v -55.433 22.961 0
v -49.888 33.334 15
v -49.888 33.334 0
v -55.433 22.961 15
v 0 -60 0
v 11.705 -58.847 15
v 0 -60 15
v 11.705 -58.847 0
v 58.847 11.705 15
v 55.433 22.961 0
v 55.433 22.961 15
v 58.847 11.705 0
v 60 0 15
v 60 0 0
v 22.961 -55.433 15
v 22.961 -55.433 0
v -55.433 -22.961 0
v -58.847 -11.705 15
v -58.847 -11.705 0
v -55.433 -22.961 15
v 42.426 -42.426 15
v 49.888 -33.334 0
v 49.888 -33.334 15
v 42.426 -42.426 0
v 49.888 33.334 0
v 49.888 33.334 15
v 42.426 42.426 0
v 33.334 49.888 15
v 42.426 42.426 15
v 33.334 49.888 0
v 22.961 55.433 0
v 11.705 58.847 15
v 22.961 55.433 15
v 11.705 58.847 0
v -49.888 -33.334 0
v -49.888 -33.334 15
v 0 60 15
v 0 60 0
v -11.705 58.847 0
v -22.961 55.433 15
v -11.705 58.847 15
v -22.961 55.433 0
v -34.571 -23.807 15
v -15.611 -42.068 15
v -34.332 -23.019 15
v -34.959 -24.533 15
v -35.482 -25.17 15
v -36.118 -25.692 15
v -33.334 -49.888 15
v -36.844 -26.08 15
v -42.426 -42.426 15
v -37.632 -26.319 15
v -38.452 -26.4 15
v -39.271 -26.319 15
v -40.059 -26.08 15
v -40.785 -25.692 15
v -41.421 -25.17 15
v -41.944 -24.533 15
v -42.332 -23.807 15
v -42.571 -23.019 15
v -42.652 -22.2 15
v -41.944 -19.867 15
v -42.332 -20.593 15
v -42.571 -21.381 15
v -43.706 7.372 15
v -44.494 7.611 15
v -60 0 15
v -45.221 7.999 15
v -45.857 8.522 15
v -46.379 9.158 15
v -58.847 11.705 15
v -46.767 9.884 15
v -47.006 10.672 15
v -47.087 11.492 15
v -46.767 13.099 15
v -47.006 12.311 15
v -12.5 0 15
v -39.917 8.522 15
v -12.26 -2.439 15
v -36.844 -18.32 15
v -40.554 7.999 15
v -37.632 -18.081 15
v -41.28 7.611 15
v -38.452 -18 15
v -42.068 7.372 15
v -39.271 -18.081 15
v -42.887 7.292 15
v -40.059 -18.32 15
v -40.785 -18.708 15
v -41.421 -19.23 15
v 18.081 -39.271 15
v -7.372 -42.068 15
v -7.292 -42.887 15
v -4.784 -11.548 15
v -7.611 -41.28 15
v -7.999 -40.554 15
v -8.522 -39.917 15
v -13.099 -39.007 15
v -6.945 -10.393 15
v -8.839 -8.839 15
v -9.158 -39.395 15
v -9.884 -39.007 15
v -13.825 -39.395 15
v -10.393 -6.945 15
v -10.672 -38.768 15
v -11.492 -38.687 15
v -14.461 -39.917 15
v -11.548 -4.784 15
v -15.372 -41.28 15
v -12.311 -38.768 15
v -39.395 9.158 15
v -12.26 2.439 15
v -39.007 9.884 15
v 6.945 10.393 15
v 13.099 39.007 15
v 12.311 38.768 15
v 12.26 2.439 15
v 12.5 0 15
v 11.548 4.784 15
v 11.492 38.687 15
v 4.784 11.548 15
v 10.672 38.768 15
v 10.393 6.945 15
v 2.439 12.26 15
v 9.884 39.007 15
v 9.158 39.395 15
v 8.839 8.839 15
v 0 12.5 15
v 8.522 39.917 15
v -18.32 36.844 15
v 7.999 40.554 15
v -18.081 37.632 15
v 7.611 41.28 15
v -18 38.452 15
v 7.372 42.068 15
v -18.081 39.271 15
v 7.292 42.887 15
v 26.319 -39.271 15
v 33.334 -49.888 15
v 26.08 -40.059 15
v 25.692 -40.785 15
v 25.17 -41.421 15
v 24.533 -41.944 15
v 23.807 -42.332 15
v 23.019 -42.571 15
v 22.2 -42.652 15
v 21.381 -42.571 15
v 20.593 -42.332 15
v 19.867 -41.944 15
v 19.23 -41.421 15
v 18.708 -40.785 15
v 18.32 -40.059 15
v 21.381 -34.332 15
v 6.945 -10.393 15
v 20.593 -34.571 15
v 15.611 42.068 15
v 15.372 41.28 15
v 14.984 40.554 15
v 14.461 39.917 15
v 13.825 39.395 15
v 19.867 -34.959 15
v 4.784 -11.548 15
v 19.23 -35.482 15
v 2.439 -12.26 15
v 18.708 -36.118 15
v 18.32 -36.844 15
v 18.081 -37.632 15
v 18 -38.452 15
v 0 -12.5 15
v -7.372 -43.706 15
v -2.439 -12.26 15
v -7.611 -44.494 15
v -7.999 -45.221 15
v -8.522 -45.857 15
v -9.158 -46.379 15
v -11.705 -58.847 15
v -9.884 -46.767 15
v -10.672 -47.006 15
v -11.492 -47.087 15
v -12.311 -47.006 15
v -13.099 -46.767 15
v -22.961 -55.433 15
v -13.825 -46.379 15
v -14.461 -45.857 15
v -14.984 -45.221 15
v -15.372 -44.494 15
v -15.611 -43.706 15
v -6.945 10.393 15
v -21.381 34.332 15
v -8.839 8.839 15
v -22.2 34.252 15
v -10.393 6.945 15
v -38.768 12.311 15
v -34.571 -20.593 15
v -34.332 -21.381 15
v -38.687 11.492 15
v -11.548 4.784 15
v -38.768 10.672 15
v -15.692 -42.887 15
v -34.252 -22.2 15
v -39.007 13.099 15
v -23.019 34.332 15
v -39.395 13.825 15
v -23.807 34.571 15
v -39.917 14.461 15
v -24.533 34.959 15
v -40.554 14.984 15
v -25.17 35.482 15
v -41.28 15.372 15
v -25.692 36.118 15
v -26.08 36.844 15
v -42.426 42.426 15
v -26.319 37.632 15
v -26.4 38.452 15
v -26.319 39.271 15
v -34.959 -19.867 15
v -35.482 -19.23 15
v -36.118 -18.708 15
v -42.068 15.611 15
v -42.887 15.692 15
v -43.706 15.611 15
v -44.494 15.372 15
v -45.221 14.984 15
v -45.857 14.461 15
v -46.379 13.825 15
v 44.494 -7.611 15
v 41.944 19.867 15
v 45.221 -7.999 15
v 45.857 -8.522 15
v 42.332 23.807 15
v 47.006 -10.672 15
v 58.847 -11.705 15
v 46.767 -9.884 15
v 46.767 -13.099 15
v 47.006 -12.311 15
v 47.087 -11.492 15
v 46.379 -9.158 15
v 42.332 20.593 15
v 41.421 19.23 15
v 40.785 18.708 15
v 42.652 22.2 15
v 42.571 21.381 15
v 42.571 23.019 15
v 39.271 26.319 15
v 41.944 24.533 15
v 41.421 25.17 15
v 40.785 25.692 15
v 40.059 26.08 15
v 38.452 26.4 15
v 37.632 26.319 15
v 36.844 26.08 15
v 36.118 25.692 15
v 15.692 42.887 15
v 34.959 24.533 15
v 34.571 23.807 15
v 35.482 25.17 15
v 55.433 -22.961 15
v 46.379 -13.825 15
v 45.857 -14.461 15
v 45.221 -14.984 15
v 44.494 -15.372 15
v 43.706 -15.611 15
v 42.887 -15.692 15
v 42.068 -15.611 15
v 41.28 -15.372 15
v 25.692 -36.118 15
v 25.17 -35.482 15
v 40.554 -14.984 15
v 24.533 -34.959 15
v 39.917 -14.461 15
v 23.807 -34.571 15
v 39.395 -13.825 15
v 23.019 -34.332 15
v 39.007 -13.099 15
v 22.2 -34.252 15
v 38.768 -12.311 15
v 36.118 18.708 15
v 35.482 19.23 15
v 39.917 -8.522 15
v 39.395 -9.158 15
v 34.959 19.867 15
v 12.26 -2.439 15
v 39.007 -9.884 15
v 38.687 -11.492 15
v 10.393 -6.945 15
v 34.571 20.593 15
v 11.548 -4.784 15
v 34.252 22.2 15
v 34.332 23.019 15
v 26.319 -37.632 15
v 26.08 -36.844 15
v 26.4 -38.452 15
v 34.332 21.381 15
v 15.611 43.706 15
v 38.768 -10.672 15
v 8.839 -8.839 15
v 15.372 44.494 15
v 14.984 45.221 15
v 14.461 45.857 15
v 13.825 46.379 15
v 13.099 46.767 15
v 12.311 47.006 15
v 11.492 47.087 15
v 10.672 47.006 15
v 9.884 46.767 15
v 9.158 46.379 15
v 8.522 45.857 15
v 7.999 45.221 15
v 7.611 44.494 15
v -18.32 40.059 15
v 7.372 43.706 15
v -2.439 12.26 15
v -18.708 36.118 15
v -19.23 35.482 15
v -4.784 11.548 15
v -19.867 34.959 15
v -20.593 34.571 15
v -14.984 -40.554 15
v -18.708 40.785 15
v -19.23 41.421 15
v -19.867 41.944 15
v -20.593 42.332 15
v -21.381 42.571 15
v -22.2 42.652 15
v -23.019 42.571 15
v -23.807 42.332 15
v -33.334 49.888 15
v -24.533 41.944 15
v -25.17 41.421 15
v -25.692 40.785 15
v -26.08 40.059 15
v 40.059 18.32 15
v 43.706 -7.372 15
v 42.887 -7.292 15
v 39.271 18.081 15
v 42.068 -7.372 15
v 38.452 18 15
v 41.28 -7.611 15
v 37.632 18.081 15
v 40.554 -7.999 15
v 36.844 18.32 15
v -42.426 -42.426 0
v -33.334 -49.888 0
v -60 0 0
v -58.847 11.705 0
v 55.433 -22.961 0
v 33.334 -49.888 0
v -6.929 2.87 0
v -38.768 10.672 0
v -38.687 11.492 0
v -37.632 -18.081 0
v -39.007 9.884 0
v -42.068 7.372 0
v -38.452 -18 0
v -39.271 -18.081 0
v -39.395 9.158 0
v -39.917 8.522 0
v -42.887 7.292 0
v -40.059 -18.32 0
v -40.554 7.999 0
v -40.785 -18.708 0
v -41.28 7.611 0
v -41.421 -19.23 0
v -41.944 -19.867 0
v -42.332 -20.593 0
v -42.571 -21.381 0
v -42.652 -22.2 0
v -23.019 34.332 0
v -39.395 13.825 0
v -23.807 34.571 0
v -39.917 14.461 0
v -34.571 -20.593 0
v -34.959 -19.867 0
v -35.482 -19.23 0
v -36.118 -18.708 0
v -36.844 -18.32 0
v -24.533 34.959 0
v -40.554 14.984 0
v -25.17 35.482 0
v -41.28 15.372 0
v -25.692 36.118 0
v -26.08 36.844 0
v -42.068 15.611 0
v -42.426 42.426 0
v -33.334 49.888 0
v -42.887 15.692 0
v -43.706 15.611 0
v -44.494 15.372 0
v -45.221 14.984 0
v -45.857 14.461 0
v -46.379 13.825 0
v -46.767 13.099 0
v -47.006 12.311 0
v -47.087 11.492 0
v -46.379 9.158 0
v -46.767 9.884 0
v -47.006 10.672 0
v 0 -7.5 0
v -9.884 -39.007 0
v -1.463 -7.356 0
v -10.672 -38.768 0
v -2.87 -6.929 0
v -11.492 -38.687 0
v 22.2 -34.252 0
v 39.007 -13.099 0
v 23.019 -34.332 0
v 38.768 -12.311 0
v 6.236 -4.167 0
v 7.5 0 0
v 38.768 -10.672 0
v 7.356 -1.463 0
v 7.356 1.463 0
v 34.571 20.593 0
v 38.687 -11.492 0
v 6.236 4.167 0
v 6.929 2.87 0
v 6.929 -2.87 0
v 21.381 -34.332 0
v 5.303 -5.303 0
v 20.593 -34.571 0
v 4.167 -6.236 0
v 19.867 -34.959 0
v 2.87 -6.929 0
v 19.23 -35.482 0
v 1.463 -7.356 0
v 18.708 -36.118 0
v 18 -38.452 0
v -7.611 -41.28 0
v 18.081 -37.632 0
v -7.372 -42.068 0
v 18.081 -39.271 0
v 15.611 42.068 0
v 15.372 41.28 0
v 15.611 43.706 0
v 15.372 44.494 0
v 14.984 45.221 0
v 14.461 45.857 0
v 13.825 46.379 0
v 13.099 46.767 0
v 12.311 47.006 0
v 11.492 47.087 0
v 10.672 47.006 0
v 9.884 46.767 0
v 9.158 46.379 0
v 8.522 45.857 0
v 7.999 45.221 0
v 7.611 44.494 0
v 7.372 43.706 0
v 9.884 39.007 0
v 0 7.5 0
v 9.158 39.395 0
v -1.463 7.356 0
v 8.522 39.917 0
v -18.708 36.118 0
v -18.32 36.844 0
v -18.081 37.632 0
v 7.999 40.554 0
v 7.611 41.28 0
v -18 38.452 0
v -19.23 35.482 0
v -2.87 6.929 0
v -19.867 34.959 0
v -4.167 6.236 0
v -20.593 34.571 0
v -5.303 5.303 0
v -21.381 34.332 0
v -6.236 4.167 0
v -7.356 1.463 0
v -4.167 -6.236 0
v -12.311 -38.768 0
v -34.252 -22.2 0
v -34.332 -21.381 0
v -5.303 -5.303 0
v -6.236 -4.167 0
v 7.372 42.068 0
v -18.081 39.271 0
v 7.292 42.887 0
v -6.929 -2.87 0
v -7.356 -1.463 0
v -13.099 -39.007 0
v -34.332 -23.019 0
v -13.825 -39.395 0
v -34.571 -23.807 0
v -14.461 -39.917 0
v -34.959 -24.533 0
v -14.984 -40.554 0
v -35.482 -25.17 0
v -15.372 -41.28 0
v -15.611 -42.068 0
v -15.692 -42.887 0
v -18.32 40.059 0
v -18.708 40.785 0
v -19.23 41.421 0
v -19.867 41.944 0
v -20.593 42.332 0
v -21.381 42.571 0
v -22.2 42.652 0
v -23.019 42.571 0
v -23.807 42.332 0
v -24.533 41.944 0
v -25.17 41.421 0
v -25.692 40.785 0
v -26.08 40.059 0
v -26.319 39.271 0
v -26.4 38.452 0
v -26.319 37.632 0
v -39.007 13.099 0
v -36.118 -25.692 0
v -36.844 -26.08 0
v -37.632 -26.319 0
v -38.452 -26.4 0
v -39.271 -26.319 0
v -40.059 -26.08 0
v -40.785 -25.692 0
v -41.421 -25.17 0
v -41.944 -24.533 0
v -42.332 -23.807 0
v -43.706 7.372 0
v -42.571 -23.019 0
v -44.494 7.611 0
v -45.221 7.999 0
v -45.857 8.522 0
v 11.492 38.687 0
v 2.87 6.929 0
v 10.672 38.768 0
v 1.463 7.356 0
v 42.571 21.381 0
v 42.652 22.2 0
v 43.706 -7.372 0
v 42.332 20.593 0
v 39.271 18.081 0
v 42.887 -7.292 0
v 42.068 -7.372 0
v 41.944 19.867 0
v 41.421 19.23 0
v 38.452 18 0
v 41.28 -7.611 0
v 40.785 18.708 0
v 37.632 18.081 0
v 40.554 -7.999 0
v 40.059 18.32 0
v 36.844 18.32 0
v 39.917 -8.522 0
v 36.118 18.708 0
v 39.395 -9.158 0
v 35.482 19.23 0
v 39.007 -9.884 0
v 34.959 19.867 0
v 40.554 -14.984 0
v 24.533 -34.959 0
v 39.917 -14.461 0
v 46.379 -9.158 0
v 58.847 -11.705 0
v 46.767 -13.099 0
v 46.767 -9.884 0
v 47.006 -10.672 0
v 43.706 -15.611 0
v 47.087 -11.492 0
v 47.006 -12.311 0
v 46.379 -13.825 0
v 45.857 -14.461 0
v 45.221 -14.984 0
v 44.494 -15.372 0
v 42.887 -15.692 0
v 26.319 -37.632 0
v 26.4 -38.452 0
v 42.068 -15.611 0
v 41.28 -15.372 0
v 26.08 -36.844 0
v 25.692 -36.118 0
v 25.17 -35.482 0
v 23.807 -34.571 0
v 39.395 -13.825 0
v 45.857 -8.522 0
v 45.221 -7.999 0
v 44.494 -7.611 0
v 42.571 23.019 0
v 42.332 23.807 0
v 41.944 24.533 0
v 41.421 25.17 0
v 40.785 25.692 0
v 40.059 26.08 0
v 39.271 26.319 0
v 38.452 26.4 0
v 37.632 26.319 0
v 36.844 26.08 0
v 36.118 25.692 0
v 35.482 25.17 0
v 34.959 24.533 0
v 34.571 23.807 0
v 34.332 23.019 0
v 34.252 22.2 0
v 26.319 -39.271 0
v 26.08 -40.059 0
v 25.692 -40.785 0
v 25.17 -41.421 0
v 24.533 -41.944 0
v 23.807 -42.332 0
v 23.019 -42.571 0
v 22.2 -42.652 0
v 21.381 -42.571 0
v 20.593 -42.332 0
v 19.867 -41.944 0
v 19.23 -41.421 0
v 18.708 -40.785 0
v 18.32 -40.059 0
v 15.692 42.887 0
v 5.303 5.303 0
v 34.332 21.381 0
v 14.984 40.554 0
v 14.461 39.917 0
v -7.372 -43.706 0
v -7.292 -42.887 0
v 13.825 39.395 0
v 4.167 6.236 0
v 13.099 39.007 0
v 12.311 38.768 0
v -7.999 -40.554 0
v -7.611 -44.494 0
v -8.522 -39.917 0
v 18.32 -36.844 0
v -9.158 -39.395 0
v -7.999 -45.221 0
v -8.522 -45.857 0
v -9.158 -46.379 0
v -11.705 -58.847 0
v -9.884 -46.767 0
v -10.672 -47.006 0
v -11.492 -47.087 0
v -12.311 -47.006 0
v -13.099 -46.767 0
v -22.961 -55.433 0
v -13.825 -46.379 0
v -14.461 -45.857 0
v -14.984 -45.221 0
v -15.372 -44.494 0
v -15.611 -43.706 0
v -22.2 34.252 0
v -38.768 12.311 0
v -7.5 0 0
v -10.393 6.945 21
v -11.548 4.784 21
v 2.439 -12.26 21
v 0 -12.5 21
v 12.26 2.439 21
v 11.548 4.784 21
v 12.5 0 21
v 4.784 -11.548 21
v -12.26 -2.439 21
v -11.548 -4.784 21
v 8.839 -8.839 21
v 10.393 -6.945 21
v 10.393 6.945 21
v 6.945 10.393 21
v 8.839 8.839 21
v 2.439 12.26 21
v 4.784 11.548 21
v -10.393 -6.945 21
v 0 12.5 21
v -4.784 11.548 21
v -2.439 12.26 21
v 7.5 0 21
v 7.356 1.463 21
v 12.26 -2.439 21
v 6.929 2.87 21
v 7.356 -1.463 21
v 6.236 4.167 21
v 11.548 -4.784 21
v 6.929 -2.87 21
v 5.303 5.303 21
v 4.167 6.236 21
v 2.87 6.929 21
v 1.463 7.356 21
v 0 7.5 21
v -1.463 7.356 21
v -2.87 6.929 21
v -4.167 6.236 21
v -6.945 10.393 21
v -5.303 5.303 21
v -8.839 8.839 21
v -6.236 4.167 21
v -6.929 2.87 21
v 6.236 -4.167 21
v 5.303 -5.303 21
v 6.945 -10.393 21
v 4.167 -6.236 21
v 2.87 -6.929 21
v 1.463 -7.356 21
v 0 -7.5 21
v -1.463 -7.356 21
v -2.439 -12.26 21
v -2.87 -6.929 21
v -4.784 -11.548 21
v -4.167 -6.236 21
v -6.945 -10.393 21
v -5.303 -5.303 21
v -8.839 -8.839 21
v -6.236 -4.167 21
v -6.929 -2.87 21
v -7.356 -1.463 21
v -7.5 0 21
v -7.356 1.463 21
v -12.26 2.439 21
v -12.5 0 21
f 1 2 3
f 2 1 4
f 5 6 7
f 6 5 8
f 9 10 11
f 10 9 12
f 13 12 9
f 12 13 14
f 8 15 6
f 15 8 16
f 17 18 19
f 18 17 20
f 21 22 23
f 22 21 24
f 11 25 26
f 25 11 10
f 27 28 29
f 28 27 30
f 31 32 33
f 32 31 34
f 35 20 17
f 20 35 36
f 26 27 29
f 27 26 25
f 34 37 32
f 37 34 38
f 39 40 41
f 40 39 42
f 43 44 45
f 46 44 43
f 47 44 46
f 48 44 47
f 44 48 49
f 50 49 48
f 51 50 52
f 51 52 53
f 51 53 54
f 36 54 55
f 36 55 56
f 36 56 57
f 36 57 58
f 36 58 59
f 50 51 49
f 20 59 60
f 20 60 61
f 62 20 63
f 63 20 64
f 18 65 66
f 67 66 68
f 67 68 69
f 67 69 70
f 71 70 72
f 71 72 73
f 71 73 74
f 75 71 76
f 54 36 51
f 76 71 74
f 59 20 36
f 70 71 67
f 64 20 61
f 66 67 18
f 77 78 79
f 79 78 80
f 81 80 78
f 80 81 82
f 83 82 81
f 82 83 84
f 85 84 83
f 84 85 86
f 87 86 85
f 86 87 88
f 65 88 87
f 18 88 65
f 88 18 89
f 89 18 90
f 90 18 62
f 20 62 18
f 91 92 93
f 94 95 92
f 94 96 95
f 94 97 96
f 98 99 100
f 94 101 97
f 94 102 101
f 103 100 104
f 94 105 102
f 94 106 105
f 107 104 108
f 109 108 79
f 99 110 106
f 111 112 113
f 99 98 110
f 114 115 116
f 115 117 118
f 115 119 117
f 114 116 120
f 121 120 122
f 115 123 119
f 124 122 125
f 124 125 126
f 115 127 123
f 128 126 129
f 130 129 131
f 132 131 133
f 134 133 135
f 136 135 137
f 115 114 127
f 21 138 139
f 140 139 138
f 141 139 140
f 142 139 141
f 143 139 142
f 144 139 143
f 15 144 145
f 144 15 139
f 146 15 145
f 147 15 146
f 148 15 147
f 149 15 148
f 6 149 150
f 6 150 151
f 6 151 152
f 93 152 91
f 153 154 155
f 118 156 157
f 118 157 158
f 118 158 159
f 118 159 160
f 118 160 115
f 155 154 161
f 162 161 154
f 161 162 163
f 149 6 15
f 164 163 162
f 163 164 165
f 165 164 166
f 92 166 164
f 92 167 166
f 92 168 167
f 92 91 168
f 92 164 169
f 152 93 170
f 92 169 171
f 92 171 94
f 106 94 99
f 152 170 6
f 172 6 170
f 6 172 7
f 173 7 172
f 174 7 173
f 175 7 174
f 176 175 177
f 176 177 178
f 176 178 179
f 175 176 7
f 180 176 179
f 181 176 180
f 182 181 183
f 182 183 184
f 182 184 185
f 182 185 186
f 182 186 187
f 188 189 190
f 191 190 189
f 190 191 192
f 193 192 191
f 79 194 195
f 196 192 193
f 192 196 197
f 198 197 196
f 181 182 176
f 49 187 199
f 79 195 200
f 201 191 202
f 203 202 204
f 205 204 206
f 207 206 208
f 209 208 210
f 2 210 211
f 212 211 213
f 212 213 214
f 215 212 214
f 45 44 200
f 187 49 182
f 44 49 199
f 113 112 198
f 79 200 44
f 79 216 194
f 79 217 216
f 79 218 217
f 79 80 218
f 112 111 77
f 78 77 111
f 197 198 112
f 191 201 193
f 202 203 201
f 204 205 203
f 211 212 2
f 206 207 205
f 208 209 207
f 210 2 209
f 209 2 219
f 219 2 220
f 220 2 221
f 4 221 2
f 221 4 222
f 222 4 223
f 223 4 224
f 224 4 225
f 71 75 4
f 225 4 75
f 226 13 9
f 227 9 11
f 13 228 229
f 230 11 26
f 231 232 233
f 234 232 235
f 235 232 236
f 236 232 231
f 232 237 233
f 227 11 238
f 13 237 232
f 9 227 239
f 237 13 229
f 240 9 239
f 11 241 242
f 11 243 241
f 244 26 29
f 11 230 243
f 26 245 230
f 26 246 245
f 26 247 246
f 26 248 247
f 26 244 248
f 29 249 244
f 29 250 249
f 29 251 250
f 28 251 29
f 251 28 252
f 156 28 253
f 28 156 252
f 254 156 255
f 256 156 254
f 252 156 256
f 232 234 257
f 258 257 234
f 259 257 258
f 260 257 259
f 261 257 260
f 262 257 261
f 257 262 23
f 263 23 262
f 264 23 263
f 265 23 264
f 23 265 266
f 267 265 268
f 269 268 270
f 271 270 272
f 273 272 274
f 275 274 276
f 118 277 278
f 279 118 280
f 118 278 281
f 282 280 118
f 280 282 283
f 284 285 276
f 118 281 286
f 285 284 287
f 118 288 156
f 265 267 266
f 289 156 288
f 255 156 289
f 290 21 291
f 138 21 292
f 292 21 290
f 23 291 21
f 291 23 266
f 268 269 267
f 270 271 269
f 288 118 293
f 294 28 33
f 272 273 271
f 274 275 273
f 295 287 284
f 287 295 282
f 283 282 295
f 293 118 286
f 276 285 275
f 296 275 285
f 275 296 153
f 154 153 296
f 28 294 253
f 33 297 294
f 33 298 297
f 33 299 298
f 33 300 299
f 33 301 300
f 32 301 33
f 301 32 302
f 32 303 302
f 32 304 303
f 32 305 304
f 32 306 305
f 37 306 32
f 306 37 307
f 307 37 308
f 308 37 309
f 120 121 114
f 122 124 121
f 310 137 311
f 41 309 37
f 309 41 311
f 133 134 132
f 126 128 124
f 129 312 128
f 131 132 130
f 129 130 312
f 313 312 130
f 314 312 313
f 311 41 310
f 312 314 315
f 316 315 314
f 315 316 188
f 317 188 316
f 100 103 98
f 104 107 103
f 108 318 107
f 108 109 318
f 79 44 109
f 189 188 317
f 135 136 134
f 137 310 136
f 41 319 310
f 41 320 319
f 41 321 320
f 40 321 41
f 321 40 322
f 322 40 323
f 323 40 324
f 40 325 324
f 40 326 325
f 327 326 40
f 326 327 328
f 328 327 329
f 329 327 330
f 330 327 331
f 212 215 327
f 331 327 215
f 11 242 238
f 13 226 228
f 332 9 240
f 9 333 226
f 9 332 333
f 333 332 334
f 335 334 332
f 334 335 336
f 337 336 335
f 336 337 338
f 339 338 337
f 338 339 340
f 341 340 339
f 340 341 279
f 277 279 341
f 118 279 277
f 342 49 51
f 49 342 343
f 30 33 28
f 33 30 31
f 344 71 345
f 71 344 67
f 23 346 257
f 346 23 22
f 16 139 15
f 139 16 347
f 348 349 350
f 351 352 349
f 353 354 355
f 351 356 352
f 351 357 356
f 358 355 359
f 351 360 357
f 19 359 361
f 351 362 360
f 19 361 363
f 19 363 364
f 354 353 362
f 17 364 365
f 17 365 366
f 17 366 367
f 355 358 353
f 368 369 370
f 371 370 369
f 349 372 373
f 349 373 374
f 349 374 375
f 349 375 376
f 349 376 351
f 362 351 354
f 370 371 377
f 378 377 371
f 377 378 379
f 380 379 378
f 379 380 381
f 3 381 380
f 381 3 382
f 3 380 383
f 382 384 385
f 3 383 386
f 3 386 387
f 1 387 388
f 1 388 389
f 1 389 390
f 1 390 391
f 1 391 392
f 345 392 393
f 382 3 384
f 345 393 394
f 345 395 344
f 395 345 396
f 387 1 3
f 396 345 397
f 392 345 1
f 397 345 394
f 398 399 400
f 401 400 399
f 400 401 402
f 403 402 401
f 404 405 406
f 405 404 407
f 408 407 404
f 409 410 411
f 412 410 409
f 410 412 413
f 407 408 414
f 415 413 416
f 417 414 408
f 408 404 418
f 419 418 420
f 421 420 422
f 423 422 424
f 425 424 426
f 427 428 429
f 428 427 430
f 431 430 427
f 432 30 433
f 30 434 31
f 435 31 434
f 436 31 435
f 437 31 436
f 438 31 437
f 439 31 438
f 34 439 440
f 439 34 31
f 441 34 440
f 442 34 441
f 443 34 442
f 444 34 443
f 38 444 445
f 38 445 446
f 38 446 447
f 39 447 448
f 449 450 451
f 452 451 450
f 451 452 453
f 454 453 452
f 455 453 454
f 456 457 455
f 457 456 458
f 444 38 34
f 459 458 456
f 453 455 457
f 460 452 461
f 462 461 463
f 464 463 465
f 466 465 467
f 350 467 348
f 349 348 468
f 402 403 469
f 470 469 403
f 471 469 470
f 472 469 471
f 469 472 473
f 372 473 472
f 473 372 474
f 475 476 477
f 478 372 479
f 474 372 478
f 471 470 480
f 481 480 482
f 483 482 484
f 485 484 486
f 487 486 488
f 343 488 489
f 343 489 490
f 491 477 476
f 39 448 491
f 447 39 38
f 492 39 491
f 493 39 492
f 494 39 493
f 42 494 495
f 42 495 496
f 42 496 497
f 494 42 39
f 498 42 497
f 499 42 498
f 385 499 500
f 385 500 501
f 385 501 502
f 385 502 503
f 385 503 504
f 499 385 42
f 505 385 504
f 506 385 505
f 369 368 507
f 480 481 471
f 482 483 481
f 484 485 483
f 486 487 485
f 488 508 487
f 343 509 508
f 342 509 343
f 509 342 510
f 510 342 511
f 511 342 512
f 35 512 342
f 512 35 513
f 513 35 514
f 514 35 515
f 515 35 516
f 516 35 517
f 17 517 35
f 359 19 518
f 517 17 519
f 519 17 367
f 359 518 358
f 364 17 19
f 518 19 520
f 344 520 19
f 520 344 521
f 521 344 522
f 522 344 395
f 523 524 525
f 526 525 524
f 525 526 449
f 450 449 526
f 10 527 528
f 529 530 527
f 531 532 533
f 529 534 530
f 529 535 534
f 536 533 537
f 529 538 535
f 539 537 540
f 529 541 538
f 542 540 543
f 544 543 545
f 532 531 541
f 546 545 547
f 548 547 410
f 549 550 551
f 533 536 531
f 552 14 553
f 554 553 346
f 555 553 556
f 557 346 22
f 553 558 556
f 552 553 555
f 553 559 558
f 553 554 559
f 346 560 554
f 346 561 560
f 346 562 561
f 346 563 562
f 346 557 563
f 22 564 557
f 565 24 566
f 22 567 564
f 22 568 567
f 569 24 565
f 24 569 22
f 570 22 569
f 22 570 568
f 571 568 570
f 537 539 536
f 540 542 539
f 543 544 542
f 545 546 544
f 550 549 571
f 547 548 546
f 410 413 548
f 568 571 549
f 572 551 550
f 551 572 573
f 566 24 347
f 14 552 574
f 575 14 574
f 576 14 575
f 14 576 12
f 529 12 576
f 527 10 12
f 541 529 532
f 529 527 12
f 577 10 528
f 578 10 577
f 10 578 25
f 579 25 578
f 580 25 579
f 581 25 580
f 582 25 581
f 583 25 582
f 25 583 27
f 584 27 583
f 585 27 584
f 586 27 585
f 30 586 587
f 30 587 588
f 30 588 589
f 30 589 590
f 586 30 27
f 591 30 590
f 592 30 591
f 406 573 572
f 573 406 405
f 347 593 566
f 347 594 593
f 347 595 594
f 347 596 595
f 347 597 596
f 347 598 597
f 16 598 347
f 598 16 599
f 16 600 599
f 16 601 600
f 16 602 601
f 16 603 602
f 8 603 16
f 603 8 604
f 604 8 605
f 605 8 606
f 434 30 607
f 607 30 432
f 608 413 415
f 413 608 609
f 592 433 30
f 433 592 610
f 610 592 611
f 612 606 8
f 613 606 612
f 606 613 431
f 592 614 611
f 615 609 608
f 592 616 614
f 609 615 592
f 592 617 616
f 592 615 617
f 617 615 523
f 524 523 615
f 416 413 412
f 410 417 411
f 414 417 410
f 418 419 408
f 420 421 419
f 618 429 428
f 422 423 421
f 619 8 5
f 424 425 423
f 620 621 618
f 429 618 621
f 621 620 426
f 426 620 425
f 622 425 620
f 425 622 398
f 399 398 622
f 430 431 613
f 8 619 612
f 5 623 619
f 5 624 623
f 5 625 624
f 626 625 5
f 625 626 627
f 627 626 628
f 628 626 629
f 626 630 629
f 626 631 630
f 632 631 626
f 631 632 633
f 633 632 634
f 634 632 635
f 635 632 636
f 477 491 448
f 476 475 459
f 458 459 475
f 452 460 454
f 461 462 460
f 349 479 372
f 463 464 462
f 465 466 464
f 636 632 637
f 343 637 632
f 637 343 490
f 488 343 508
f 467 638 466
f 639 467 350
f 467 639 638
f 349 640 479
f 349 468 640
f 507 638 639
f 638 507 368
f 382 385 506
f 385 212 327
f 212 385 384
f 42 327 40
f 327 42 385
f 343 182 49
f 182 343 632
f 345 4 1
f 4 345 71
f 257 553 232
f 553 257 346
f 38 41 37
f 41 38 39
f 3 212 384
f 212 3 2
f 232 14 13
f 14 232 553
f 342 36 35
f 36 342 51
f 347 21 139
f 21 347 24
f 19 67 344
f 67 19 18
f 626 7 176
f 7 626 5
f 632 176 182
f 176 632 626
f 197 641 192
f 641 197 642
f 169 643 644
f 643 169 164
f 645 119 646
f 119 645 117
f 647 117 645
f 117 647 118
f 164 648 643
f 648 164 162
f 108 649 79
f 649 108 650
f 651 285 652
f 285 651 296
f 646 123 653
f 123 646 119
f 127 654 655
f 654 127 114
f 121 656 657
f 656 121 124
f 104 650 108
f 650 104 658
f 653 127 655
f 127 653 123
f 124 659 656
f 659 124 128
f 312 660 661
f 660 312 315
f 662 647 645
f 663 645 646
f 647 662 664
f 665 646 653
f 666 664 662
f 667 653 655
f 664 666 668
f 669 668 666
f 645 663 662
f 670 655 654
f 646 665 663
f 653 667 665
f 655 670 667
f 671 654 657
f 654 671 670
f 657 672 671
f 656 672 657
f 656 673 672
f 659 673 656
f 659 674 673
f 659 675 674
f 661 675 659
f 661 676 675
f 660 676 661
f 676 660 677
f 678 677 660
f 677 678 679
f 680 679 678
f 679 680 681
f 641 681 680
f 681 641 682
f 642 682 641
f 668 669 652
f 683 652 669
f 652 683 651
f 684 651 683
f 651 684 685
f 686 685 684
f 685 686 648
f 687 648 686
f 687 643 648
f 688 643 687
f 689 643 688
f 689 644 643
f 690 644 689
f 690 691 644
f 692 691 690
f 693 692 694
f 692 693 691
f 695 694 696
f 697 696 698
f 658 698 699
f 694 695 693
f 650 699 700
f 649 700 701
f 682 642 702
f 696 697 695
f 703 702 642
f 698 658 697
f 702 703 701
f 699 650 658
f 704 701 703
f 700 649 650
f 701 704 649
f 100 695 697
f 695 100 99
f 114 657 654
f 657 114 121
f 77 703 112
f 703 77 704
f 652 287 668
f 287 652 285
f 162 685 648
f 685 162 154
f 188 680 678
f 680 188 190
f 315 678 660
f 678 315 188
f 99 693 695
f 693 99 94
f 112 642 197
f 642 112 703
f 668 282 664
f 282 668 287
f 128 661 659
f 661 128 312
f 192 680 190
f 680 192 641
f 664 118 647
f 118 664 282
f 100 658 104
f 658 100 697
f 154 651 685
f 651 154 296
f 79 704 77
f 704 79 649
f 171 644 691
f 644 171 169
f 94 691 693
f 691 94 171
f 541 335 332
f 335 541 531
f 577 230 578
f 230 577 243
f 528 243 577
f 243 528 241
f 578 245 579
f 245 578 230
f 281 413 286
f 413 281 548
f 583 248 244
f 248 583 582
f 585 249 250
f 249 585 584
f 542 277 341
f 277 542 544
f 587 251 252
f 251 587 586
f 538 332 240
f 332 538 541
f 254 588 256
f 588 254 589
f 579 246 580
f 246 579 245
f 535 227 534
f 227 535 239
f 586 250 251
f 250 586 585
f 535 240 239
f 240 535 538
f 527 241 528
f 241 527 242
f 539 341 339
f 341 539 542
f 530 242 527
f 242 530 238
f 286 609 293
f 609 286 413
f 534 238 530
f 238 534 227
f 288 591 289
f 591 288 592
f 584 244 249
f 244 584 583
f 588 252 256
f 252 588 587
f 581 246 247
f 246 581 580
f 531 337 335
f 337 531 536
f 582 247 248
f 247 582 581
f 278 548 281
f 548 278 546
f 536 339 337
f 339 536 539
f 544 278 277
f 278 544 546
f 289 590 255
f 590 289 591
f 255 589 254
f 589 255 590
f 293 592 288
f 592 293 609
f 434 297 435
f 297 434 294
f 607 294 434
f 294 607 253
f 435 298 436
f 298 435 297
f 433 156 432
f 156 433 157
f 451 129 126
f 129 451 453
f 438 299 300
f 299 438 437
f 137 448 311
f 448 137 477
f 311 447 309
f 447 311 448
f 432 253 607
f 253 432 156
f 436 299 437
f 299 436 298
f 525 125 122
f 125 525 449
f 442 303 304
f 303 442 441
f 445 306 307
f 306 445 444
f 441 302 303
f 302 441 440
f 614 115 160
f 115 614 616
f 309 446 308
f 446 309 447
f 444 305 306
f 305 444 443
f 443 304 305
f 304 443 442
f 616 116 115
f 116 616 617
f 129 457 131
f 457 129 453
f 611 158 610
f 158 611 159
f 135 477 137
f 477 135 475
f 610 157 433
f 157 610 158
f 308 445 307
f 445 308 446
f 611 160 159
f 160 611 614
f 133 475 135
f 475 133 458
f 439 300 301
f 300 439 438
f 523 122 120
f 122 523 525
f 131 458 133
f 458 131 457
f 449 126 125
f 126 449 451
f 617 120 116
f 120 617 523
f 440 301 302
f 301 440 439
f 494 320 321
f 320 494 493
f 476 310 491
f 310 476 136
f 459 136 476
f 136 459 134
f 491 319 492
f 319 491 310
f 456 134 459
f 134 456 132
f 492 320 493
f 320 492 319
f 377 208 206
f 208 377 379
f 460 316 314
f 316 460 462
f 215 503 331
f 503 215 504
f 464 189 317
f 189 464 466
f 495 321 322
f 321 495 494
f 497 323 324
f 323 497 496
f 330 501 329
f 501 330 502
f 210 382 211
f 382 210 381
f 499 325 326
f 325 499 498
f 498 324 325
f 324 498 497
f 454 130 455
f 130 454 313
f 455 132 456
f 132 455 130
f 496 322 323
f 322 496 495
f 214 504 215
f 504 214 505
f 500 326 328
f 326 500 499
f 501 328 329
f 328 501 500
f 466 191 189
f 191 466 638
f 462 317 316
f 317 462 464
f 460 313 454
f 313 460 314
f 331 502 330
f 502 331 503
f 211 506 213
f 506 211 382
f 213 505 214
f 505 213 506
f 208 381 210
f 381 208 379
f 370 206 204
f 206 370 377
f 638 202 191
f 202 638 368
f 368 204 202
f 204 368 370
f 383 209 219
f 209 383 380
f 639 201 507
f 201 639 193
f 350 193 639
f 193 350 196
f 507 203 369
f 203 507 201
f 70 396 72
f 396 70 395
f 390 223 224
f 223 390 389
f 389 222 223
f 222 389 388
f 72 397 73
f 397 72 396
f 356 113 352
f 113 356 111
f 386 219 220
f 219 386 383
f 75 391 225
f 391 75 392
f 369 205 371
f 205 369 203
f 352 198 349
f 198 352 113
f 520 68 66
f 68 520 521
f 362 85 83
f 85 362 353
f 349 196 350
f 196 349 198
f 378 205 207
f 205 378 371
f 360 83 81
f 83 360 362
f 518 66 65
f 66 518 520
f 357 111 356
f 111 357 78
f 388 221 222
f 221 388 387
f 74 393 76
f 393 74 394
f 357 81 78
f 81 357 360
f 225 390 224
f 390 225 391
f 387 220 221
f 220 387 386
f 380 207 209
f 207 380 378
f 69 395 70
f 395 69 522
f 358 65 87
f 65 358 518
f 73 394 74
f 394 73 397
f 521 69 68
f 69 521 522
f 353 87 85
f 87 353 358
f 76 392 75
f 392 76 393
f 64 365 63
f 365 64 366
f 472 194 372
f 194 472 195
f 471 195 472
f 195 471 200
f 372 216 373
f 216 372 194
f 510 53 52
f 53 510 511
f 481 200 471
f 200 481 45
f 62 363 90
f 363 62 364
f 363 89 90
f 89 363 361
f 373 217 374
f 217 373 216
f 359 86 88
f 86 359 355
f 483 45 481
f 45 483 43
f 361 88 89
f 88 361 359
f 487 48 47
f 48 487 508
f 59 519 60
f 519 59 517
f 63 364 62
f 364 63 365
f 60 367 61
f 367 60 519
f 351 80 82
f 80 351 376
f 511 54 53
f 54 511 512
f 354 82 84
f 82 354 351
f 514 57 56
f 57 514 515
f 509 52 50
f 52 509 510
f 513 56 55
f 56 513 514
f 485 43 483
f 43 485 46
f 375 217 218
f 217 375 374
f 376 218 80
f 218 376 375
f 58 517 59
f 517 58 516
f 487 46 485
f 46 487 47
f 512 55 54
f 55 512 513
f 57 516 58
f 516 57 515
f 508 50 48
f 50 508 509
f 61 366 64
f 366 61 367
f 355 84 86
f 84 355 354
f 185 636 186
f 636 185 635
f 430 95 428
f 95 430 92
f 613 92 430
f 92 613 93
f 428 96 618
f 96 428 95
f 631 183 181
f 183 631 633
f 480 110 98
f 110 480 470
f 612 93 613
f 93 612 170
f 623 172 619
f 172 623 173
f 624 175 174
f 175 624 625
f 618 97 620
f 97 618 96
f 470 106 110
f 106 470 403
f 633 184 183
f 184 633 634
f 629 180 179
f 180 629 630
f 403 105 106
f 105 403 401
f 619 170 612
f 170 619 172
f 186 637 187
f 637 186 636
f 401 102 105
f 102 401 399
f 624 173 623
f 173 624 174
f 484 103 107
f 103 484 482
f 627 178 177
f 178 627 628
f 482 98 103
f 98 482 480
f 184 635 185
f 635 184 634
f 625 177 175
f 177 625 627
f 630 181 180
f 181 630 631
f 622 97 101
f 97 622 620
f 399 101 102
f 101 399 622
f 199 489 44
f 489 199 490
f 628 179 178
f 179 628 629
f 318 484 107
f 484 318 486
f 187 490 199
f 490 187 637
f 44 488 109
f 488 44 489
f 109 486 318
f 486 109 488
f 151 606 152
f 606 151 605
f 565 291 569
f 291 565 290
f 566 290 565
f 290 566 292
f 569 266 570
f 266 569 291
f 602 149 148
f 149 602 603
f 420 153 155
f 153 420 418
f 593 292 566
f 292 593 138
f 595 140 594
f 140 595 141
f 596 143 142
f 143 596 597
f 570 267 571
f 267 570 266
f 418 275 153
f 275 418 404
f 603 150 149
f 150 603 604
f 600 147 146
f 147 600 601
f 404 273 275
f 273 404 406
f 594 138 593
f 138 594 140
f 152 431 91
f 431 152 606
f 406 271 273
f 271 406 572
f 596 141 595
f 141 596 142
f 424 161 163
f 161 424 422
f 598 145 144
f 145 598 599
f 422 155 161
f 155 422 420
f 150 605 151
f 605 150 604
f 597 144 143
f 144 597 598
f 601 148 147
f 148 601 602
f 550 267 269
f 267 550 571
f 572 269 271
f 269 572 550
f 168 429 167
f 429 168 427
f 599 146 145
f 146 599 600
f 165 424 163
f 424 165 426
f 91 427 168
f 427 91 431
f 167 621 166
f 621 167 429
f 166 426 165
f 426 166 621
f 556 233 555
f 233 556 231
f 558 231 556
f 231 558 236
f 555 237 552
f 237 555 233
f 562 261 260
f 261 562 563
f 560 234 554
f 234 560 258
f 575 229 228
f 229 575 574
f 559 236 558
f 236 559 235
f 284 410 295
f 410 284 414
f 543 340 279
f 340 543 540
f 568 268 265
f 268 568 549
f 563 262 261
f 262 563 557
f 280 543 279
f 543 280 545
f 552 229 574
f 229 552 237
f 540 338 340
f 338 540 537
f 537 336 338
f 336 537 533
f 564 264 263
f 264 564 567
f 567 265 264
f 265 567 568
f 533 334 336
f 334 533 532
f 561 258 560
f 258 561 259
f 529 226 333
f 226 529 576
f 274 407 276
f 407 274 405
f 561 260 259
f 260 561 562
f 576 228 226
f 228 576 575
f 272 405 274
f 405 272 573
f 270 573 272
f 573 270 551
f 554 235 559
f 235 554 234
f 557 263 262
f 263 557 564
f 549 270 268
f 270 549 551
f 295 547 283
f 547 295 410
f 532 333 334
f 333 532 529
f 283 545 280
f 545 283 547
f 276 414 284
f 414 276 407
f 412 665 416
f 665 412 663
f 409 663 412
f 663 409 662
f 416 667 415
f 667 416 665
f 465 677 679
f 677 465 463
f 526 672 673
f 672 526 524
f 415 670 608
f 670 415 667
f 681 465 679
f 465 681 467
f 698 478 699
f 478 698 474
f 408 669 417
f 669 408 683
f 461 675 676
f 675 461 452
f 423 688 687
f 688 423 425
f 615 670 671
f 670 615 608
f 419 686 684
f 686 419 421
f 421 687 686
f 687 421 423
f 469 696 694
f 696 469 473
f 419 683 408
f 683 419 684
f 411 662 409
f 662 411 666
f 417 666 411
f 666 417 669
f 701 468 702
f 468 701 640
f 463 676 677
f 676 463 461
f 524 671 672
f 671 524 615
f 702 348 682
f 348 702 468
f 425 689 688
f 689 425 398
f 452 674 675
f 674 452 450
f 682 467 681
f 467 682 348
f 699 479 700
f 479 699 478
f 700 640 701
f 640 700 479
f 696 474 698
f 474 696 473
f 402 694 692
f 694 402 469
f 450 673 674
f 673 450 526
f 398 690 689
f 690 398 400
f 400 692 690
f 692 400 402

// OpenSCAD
$fn = 32;

// ----------------------------------------------------------------------
// Flange Ø120 x 15
// 8 holes on a Ø88.8 bolt circle, bolted joints
// ----------------------------------------------------------------------

// --- parameters (mm) ---
flange_d = 120;  // outside diameter of the flange
thickness = 15;  // flange thickness
holes = 8;       // number of bolt holes
pcd = 88.8;      // bolt circle diameter
start_deg = 30;  // angle of the first hole, from +X
hole_d = 8.4;    // bolt hole diameter
bore_d = 15;     // central through bore
hub_d = 25;      // hub outside diameter
hub_h = 6;       // hub height above the flange face (0 = no hub)

// --- derived feature positions (mm) ---
height = thickness + hub_h;  // = 21   overall height of the part
pcd_r = pcd / 2;             // = 44.4   bolt circle radius
hole_step = 360 / holes;     // = 45   angular pitch
feature_centers = [
  [pcd_r * cos(start_deg + 0 * hole_step), pcd_r * sin(start_deg + 0 * hole_step)],
  [pcd_r * cos(start_deg + 1 * hole_step), pcd_r * sin(start_deg + 1 * hole_step)],
  [pcd_r * cos(start_deg + 2 * hole_step), pcd_r * sin(start_deg + 2 * hole_step)],
  [pcd_r * cos(start_deg + 3 * hole_step), pcd_r * sin(start_deg + 3 * hole_step)],
  [pcd_r * cos(start_deg + 4 * hole_step), pcd_r * sin(start_deg + 4 * hole_step)],
  [pcd_r * cos(start_deg + 5 * hole_step), pcd_r * sin(start_deg + 5 * hole_step)],
  [pcd_r * cos(start_deg + 6 * hole_step), pcd_r * sin(start_deg + 6 * hole_step)],
  [pcd_r * cos(start_deg + 7 * hole_step), pcd_r * sin(start_deg + 7 * hole_step)]
];   // bolt hole centres on the pitch circle

// flange disc, every hole and the bore cut straight through
difference() {
  union() {
    cylinder(d = flange_d, h = thickness);
    cylinder(d = hub_d, h = height);  // hub, overlapped into the flange
  }
  translate([0, 0, -1]) cylinder(d = bore_d, h = height + 2);  // bore, through
  for (centre = feature_centers)
    translate([centre[0], centre[1], -1]) cylinder(d = hole_d, h = thickness + 2);
}
